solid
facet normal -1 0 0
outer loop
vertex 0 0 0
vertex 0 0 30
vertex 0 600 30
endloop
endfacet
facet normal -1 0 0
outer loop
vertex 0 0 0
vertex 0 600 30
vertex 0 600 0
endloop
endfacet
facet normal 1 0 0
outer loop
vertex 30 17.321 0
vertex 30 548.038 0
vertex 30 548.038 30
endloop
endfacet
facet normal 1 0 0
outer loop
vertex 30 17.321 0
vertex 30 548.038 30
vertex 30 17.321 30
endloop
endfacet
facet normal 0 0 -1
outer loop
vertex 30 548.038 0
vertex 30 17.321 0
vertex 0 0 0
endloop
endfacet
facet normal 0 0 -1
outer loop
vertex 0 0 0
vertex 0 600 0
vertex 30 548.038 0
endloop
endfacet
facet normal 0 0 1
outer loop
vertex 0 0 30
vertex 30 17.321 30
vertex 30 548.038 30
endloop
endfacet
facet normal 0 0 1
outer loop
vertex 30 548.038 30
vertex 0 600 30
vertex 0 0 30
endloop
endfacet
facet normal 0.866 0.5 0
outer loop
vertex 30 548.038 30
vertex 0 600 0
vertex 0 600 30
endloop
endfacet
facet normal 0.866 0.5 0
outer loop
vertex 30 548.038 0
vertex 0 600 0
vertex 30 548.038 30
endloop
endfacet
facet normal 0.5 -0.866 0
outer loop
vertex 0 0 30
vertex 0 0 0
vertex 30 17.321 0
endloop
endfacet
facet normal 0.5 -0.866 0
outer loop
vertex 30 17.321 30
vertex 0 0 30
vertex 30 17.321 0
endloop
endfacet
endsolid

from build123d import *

# Parameters (mm, degrees)
SKETCH_1_W          = 30
SKETCH_1_H          = 30
EXTRUDE_1_DEPTH     = 600
CUT_EXTRUDE_1_REACH = 603.498
CUT_EXTRUDE_2_REACH = 603.498
CUT_EXTRUDE_3_DEPTH = 602.498129673
EXTRUDE_2_DEPTH     = 30


with BuildPart() as part:
    # 草图1 → 凸台-拉伸1 (new body)
    with BuildSketch(Plane(origin=(0, 0, 0), x_dir=(1, 0, 0), z_dir=(0, 1, 0))):
        with Locations((15, -15)):
            Rectangle(SKETCH_1_W, SKETCH_1_H)
    extrude(amount=EXTRUDE_1_DEPTH)

    # 草图2 → 切除-拉伸1 (cut, up to next)
    with BuildSketch(Plane.XY.offset(30), mode=Mode.PRIVATE) as cut_extrude_1_sk1:
        Polygon((0, 0), (30, 8.038475773), (30, 0), align=None)
    cut_extrude_1_tool1 = extrude(cut_extrude_1_sk1.sketch, amount=-CUT_EXTRUDE_1_REACH, mode=Mode.PRIVATE) & part.part
    add(cut_extrude_1_tool1.solids().sort_by_distance((20, 2.679492, 30))[0], mode=Mode.SUBTRACT)

    # 草图3 → 切除-拉伸2 (cut, up to next)
    with BuildSketch(Plane(origin=(0, 0, 0), x_dir=(-1, 0, 0), z_dir=(0, 0, -1)), mode=Mode.PRIVATE) as cut_extrude_2_sk1:
        Polygon((0, 600), (-30, 600), (-30, 488.038475773), align=None)
    cut_extrude_2_tool1 = extrude(cut_extrude_2_sk1.sketch, amount=-CUT_EXTRUDE_2_REACH, mode=Mode.PRIVATE) & part.part
    add(cut_extrude_2_tool1.solids().sort_by_distance((20, 562.679492, 0))[0], mode=Mode.SUBTRACT)

    # 草图5 → 切除-拉伸3 (cut, through all)
    with BuildSketch(Plane(origin=(0, 0, 0), x_dir=(-1, 0, 0), z_dir=(0, 0, -1))):
        Polygon((-30, 17.320508076), (-30, 8.038475773), (0, 0), align=None)
    extrude(amount=-CUT_EXTRUDE_3_DEPTH, mode=Mode.SUBTRACT)

    # 草图6 → 凸台-拉伸2 (add)
    with BuildSketch(Plane(origin=(0, 0, 0), x_dir=(-1, 0, 0), z_dir=(0, 0, -1))):
        Polygon((-30, 488.038475773), (0, 600), (-30, 548.038475773), align=None)
    extrude(amount=-EXTRUDE_2_DEPTH)


solid = part.part
